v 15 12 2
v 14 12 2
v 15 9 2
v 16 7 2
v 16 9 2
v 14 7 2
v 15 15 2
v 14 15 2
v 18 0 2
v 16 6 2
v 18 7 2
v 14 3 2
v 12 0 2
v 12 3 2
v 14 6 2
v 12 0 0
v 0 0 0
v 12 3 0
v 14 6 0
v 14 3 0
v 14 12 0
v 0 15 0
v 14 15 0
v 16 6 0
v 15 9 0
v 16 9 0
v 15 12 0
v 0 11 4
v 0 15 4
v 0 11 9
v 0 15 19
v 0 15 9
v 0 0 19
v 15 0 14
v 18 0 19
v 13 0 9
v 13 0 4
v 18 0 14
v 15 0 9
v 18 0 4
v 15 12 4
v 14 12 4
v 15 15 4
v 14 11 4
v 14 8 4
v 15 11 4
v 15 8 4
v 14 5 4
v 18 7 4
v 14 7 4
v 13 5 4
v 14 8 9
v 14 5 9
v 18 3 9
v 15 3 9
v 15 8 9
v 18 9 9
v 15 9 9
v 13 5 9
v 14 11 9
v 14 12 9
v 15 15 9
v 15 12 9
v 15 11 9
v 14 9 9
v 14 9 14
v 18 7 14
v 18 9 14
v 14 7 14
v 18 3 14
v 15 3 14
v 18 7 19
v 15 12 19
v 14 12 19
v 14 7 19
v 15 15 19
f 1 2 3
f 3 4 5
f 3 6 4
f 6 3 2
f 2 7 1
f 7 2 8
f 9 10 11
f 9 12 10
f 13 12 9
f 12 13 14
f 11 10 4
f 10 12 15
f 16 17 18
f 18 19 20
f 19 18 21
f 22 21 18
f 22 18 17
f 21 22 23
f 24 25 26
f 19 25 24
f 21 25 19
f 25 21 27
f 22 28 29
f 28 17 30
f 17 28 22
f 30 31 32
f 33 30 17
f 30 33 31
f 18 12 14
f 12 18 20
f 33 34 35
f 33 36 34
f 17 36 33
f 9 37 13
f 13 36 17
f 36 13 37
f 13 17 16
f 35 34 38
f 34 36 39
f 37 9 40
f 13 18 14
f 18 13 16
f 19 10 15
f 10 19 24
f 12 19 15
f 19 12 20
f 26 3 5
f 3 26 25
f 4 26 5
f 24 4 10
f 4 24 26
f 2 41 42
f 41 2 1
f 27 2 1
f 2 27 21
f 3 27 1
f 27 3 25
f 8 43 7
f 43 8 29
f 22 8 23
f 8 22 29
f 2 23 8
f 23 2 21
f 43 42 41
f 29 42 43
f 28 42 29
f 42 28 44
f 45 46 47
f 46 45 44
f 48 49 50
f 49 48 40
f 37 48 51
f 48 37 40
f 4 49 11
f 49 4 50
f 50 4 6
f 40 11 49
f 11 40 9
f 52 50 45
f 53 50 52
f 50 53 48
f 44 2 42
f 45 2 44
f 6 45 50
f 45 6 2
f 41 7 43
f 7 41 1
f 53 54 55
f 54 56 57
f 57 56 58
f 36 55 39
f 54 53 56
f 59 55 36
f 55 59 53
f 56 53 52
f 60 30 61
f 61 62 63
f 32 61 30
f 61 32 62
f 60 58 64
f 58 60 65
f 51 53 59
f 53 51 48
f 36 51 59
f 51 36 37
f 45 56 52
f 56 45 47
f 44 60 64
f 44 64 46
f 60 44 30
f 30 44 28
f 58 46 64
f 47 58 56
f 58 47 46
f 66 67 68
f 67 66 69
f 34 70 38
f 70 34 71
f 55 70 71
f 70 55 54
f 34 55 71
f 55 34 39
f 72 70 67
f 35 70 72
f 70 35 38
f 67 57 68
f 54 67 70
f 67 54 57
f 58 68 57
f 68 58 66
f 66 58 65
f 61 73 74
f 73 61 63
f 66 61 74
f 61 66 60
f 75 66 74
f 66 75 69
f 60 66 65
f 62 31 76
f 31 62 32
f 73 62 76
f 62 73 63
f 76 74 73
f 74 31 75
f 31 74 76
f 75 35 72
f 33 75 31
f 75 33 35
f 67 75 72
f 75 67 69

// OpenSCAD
translate([2.5, 1.5, 1.0]) color([0.8688435220131177, 0.7514921149941085, 0.7714305883456576]) cube([5, 3, 2], center=true);
translate([8.5, 1.5, 1.0]) color([0.8829516943772963, 0.4114323292545551, 0.05394001775890156]) cube([7, 3, 2], center=true);
translate([3.5, 4.5, 1.0]) color([0.696805048854085, 0.6656296547984208, 0.6485122289860075]) cube([7, 3, 2], center=true);
translate([10.5, 4.5, 1.0]) color([0.5471816206705559, 0.7344166333532061, 0.4306045068871984]) cube([7, 3, 2], center=true);
translate([5.5, 7.5, 1.0]) color([0.45460236437769275, 0.25475221651879554, 0.47565246533915095]) cube([11, 3, 2], center=true);
translate([13.5, 7.5, 1.0]) color([0.3371942584654095, 0.04223511400675217, 0.05255331220371673]) cube([5, 3, 2], center=true);
translate([2.5, 10.5, 1.0]) color([0.34980223330761895, 0.2898096938030986, 0.007130057665757694]) cube([5, 3, 2], center=true);
translate([7.5, 10.5, 1.0]) color([0.06369015415518986, 0.42774457246440645, 0.22216650821772055]) cube([5, 3, 2], center=true);
translate([12.5, 10.5, 1.0]) color([0.6086379170158094, 0.557768500755667, 0.22097295115667703]) cube([5, 3, 2], center=true);
translate([3.5, 13.5, 1.0]) color([0.19284823789822858, 0.6083188139076446, 0.606354511401297]) cube([7, 3, 2], center=true);
translate([10.5, 13.5, 1.0]) color([0.08562053587131313, 0.31903016062772993, 0.53590115499306]) cube([7, 3, 2], center=true);
translate([5.5, 3.5, 3.0]) color([0.8934753784920533, 0.25549985489866966, 0.5219903070058861]) cube([11, 7, 2], center=true);
translate([14.5, 3.5, 3.0]) color([0.1901317713313112, 0.08011594570868696, 0.8699478397109702]) cube([7, 7, 2], center=true);
translate([3.5, 9.5, 3.0]) color([0.3457472114844995, 0.837290862214726, 0.25127706432840136]) cube([7, 5, 2], center=true);
translate([10.5, 9.5, 3.0]) color([0.7290260027021367, 0.3013213449137814, 0.5169005458056509]) cube([7, 5, 2], center=true);
translate([2.5, 13.5, 3.0]) color([0.38467176448284957, 0.4820846642847386, 0.8719757028853922]) cube([5, 3, 2], center=true);
translate([7.5, 13.5, 3.0]) color([0.2399620044566907, 0.3058147052987177, 0.5519737755681405]) cube([5, 3, 2], center=true);
translate([12.5, 13.5, 3.0]) color([0.009208459116004764, 0.4953005367860557, 0.43819859659275806]) cube([5, 3, 2], center=true);
translate([3.0, 2.5, 6.5]) color([0.9171481192782721, 0.41212019308576986, 0.49358197644734136]) cube([6, 5, 5], center=true);
translate([9.5, 2.5, 6.5]) color([0.44010860560926524, 0.0856157398333921, 0.2411443971002879]) cube([7, 5, 5], center=true);
translate([3.5, 6.5, 6.5]) color([0.8262650576639278, 0.15379567752788093, 0.8842528530898255]) cube([7, 3, 5], center=true);
translate([10.5, 6.5, 6.5]) color([0.2134665283608419, 0.6127566924478359, 0.818008657000479]) cube([7, 3, 5], center=true);
translate([2.5, 9.5, 6.5]) color([0.5590112191053322, 0.8866043301622452, 0.39447102725022787]) cube([5, 3, 5], center=true);
translate([7.5, 9.5, 6.5]) color([0.9589163376419946, 0.24972819156954773, 0.22005049979750413]) cube([5, 3, 5], center=true);
translate([12.5, 9.5, 6.5]) color([0.8404590105346786, 0.2789960200671917, 0.35210354864297055]) cube([5, 3, 5], center=true);
translate([4.0, 1.5, 11.5]) color([0.9946691500756418, 0.10728537706325991, 0.8996256313138141]) cube([8, 3, 5], center=true);
translate([11.5, 1.5, 11.5]) color([0.6100819970747507, 0.7890377134172993, 0.7110679469752405]) cube([7, 3, 5], center=true);
translate([5.5, 4.5, 11.5]) color([0.7774643558396669, 0.5140354678382717, 0.46207744282607]) cube([11, 3, 5], center=true);
translate([14.5, 4.5, 11.5]) color([0.6343562920465169, 0.27254621857246664, 0.016558424522952975]) cube([7, 3, 5], center=true);
translate([4.5, 7.5, 11.5]) color([0.6148716567717017, 0.7119066573597548, 0.17257617960039529]) cube([9, 3, 5], center=true);
translate([13.5, 7.5, 11.5]) color([0.41465974039415787, 0.21806470516739018, 0.8797884787327306]) cube([9, 3, 5], center=true);
translate([3.5, 10.5, 11.5]) color([0.9971497033508181, 0.006439244314443648, 0.5355241113549698]) cube([7, 3, 5], center=true);
translate([10.5, 10.5, 11.5]) color([0.428269623660265, 0.0497703561320445, 0.3846945959716809]) cube([7, 3, 5], center=true);
translate([2.5, 13.5, 11.5]) color([0.27248481749180187, 0.9711494351721061, 0.5646669518865992]) cube([5, 3, 5], center=true);
translate([7.5, 13.5, 11.5]) color([0.22956269737245216, 0.7165492601952248, 0.5466375027642284]) cube([5, 3, 5], center=true);
translate([12.5, 13.5, 11.5]) color([0.2821670936164109, 0.7398695784196249, 0.9015687423954613]) cube([5, 3, 5], center=true);
translate([5.5, 3.5, 16.5]) color([0.06478718309218656, 0.3075184499818515, 0.32730937178137276]) cube([11, 7, 5], center=true);
translate([14.5, 3.5, 16.5]) color([0.373196919474838, 0.48026967262350795, 0.5820603979481933]) cube([7, 7, 5], center=true);
translate([3.5, 9.5, 16.5]) color([0.1372879505883815, 0.015498761483451418, 0.5048497045627587]) cube([7, 5, 5], center=true);
translate([10.5, 9.5, 16.5]) color([0.36698725510709684, 0.6348155217266559, 0.811995686067811]) cube([7, 5, 5], center=true);
translate([2.5, 13.5, 16.5]) color([0.8768405645756486, 0.1552431358080847, 0.1767648869043179]) cube([5, 3, 5], center=true);
translate([7.5, 13.5, 16.5]) color([0.991228648099722, 0.13558077637136434, 0.20650423900368708]) cube([5, 3, 5], center=true);
translate([12.5, 13.5, 16.5]) color([0.9151210693627757, 0.49673738754911745, 0.7672539256192649]) cube([5, 3, 5], center=true);
